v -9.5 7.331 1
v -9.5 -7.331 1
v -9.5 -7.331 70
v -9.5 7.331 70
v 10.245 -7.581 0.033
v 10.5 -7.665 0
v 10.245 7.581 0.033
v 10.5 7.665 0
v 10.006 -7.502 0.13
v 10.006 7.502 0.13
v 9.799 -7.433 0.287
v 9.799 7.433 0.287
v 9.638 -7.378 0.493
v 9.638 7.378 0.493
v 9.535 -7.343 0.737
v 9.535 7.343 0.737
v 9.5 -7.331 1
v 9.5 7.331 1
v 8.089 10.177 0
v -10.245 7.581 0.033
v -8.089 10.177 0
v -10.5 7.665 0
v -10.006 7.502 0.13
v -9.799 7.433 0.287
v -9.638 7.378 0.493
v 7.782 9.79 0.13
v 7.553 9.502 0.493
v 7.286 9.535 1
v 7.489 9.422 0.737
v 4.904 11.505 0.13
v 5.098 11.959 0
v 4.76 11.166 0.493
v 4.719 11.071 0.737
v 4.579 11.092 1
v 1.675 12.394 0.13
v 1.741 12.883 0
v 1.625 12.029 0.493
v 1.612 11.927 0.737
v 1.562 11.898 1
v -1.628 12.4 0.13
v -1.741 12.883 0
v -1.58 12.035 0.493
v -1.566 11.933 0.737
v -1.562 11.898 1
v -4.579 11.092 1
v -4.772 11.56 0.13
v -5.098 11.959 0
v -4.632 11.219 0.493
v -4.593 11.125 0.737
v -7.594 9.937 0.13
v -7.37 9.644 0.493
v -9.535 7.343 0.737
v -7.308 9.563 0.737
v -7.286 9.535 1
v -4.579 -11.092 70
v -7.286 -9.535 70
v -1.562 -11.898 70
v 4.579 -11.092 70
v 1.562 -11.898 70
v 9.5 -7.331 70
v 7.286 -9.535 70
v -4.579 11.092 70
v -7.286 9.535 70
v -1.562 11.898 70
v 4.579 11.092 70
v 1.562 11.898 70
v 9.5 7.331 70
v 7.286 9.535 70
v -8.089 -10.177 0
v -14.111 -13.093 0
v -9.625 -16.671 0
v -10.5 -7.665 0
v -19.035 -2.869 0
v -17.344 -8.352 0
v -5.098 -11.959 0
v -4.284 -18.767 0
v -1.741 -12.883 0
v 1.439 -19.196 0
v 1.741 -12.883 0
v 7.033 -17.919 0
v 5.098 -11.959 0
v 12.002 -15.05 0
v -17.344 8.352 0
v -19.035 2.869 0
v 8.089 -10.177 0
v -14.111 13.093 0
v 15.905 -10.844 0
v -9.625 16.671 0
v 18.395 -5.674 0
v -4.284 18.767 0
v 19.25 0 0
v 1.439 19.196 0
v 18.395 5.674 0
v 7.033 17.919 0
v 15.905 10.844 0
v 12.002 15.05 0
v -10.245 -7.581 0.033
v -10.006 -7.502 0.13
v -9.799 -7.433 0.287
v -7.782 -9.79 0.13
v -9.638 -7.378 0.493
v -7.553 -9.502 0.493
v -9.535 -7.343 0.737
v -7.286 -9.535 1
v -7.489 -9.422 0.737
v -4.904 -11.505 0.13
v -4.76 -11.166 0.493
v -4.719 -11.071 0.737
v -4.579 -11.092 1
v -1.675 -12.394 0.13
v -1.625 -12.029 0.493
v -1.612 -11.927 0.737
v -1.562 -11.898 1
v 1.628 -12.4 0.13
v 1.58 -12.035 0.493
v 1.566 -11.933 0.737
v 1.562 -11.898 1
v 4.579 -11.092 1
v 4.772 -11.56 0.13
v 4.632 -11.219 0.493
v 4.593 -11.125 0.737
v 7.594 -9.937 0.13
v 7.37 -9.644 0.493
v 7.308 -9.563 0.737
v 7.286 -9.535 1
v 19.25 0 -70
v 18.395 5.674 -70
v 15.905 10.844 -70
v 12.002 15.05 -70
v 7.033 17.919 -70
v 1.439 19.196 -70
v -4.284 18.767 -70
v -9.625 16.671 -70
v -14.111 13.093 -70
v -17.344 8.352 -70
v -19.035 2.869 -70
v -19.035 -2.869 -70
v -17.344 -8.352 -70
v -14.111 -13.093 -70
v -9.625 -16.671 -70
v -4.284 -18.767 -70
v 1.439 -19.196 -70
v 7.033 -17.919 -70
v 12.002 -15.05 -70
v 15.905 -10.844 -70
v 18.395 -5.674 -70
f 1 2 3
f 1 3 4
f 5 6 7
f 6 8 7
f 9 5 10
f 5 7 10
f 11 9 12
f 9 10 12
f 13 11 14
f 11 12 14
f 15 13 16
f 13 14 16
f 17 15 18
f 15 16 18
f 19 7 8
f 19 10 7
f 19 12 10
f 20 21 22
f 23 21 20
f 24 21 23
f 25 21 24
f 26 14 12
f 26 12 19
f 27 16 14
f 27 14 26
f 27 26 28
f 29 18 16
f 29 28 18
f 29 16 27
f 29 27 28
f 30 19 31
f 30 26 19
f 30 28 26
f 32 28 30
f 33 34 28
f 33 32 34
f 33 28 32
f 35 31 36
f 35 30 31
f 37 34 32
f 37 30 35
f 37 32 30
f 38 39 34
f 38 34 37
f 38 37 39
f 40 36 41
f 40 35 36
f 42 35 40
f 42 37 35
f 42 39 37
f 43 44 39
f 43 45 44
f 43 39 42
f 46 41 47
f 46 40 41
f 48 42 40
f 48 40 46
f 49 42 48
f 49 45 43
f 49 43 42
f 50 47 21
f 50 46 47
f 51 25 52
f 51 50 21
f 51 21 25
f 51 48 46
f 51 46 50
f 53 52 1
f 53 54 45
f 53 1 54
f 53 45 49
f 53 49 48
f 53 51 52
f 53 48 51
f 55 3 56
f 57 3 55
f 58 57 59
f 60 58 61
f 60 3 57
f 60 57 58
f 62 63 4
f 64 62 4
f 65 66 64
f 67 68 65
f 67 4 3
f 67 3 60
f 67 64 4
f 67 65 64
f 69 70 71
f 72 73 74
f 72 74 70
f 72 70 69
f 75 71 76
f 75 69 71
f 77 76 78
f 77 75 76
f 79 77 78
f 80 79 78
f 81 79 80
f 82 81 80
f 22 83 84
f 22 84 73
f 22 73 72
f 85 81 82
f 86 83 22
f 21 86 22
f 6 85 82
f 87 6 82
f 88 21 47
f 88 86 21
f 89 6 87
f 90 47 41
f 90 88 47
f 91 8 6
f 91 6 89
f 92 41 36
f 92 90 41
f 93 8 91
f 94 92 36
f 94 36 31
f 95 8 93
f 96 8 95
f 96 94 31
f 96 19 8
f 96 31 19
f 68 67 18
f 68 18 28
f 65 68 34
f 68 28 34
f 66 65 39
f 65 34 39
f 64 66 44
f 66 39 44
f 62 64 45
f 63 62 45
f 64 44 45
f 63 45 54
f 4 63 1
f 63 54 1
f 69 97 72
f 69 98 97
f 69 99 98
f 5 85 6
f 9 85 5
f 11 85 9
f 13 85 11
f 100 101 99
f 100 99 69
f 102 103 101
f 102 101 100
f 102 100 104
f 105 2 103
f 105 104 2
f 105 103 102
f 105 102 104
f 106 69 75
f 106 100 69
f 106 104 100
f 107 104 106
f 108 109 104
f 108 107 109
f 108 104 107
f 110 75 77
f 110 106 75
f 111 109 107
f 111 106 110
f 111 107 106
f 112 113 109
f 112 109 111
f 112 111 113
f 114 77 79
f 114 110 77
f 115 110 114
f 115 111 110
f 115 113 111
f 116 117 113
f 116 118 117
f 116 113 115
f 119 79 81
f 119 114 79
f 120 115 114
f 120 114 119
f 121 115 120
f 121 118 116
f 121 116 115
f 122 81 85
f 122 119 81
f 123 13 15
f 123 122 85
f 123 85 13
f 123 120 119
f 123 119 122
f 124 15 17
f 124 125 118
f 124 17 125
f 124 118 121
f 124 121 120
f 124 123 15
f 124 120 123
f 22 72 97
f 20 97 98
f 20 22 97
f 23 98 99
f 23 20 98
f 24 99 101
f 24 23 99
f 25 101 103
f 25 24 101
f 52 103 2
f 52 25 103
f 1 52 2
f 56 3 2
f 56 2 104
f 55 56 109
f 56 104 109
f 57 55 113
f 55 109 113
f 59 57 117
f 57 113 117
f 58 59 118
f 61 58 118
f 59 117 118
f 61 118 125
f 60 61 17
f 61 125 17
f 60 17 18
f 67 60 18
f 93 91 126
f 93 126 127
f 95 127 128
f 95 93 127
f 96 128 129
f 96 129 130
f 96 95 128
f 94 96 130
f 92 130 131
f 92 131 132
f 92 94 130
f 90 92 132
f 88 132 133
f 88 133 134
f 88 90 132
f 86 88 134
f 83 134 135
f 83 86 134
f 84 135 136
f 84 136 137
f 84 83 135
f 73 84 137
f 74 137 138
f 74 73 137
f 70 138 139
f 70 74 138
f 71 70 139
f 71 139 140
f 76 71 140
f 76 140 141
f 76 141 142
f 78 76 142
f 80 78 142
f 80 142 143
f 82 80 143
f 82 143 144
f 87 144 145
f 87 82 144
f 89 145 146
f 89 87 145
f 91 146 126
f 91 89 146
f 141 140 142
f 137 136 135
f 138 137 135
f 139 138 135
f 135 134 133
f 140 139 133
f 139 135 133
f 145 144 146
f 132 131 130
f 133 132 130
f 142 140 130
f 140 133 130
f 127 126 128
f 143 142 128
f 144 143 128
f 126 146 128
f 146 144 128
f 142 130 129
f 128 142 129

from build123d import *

# Parameters (mm, degrees)
ESQUISSE1_R        = 19.25
BOSS_EXTRU_1_DEPTH = 70
BOSS_EXTRU_2_DEPTH = 70
CONG_1_R           = 1


with BuildPart() as part:
    # Esquisse1 → Boss.-Extru.1 (new body)
    with BuildSketch(Plane.XY):
        Circle(ESQUISSE1_R)
    extrude(amount=-BOSS_EXTRU_1_DEPTH)

    # Esquisse1<4> → Boss.-Extru.2 (add)
    with BuildSketch(Plane.XY):
        with BuildLine():
            Line((-9.5, 7.331439149), (-9.5, -7.331439149))
            ThreePointArc((-9.5, -7.331439149), (0, -12), (9.5, -7.331439149))
            Line((9.5, -7.331439149), (9.5, 7.331439149))
            ThreePointArc((9.5, 7.331439149), (0, 12), (-9.5, 7.331439149))
        make_face()
    extrude(amount=BOSS_EXTRU_2_DEPTH)

    # Congé1
    cong_1_edges = [part.edges().sort_by_distance(p)[0] for p in [
        (0, -12, 0),
        (-9.5, 0, 0),
        (0, 12, 0),
        (9.5, 0, 0),
    ]]
    fillet(cong_1_edges, radius=CONG_1_R)


solid = part.part
